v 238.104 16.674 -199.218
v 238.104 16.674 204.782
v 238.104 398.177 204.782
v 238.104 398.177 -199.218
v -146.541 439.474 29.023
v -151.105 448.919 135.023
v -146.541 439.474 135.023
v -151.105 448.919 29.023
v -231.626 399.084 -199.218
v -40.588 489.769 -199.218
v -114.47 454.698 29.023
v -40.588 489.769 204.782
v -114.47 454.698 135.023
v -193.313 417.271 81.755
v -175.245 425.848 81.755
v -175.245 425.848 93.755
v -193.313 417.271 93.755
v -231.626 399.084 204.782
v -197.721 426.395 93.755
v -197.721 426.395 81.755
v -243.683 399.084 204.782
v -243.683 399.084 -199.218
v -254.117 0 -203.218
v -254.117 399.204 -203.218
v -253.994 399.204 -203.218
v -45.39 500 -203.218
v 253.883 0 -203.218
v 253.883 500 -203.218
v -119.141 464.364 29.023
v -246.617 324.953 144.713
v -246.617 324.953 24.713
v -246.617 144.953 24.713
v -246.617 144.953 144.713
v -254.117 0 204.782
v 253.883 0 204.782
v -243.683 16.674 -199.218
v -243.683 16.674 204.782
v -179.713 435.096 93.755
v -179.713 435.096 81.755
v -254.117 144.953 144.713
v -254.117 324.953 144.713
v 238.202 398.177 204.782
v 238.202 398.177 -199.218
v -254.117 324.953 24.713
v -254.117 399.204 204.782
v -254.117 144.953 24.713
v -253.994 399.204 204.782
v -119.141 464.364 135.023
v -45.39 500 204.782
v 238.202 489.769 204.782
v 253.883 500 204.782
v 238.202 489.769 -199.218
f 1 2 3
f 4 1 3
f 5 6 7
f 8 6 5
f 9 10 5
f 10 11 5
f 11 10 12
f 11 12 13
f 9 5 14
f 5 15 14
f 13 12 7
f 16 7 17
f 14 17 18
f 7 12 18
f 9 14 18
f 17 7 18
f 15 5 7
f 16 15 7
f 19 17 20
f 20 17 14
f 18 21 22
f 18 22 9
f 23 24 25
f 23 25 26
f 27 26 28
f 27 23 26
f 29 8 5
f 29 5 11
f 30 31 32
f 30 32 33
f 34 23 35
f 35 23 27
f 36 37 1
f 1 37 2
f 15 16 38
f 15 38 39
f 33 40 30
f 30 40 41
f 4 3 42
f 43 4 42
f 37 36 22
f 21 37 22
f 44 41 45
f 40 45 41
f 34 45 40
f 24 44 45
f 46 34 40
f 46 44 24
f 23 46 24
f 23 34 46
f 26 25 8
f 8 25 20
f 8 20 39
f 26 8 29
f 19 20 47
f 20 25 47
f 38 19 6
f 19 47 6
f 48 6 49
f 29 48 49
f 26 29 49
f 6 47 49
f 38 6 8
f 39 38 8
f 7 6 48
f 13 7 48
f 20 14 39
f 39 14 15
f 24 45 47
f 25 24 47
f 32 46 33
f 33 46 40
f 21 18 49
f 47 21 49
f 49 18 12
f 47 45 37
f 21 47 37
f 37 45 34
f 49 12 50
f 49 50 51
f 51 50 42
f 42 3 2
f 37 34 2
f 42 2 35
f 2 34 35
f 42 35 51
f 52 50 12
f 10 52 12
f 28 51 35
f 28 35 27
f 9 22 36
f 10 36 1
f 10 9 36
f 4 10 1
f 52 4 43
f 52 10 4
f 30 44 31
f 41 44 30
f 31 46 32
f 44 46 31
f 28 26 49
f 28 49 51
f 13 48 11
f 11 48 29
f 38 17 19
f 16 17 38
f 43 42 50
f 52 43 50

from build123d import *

# Parameters (mm, degrees)
SKETCH1_W           = 508
SKETCH1_H           = 408
SKETCH1_W_2         = 500
SKETCH1_H_2         = 400
BOSS_EXTRUDE1_DEPTH = 500
SKETCH1_3_W         = 500
SKETCH1_3_H         = 400
BOSS_EXTRUDE2_DEPTH = 500
SKETCH2_W           = 120
SKETCH2_H           = 180
CUT_EXTRUDE1_DEPTH  = 7.5
SKETCH4_W           = 481.787571452
SKETCH4_H           = 382.410311639
CUT_EXTRUDE3_DEPTH  = 404
CUT_EXTRUDE4_DEPTH  = 434
CUT_EXTRUDE5_DEPTH  = 404
SKETCH10_W          = 20
SKETCH10_H          = 12
SKETCH10_W_2        = 35.5
SKETCH10_H_2        = 106
CUT_EXTRUDE6_DEPTH  = 24


with BuildPart() as part:
    # Sketch1 → Boss-Extrude1 (new body)
    with BuildSketch(Plane(origin=(0, 0, 0), x_dir=(1, 0, 0), z_dir=(0, 1, 0))):
        with Locations((-0.117405467, -0.781547842)):
            Rectangle(SKETCH1_W, SKETCH1_H)
        with Locations((-0.117405467, -0.781547842)):
            Rectangle(SKETCH1_W_2, SKETCH1_H_2, mode=Mode.SUBTRACT)
    extrude(amount=BOSS_EXTRUDE1_DEPTH)

    # Sketch1<3> → Boss-Extrude2 (add)
    with BuildSketch(Plane(origin=(0, 0, 0), x_dir=(1, 0, 0), z_dir=(0, 1, 0))):
        with Locations((-0.117405467, -0.781547842)):
            Rectangle(SKETCH1_3_W, SKETCH1_3_H)
    extrude(amount=BOSS_EXTRUDE2_DEPTH)

    # Sketch2 → Cut-Extrude1 (cut, symmetric)
    with BuildSketch(Plane.ZY.offset(254.117405467)):
        with Locations((84.712563528, 234.953187265)):
            Rectangle(SKETCH2_W, SKETCH2_H)
    extrude(amount=CUT_EXTRUDE1_DEPTH, both=True, mode=Mode.SUBTRACT)

    # Sketch4 → Cut-Extrude3 (cut, symmetric)
    with BuildSketch(Plane.XY.offset(204.781547842)):
        with Locations((-2.789371367, 207.878900207)):
            Rectangle(SKETCH4_W, SKETCH4_H)
    extrude(amount=CUT_EXTRUDE3_DEPTH, both=True, mode=Mode.SUBTRACT)

    # Sketch8 → Cut-Extrude4 (cut, symmetric)
    with BuildSketch(Plane.XY.offset(204.781547842)):
        Polygon((-254.117405467, 399.203948512), (-253.994172888, 399.203948512), (-45.39037666, 500), (-254.117405467, 500), align=None)
    extrude(amount=CUT_EXTRUDE4_DEPTH, both=True, mode=Mode.SUBTRACT)

    # Sketch9 → Cut-Extrude5 (cut, symmetric)
    with BuildSketch(Plane.XY.offset(204.781547842)):
        Polygon((-40.587805706, 489.7694832), (-231.625791255, 399.084056026), (238.104414359, 399.084056026), (238.104414359, 398.17698413), (238.202409937, 398.17698413), (238.202409937, 489.7694832), align=None)
    extrude(amount=CUT_EXTRUDE5_DEPTH, both=True, mode=Mode.SUBTRACT)

    # Sketch10 → Cut-Extrude6 (cut, symmetric)
    with BuildSketch(Plane(origin=(-204.45830182, 423.139372032, 0), x_dir=(0.9003981876242824, 0.43506678076234173, 0), z_dir=(-0.43506678076234173, 0.9003981876242824, 0))):
        with Locations((17.482156961, -87.755377662)):
            Rectangle(SKETCH10_W, SKETCH10_H)
        with Locations((77.005207248, -82.022659024)):
            Rectangle(SKETCH10_W_2, SKETCH10_H_2)
    extrude(amount=CUT_EXTRUDE6_DEPTH, both=True, mode=Mode.SUBTRACT)


solid = part.part
